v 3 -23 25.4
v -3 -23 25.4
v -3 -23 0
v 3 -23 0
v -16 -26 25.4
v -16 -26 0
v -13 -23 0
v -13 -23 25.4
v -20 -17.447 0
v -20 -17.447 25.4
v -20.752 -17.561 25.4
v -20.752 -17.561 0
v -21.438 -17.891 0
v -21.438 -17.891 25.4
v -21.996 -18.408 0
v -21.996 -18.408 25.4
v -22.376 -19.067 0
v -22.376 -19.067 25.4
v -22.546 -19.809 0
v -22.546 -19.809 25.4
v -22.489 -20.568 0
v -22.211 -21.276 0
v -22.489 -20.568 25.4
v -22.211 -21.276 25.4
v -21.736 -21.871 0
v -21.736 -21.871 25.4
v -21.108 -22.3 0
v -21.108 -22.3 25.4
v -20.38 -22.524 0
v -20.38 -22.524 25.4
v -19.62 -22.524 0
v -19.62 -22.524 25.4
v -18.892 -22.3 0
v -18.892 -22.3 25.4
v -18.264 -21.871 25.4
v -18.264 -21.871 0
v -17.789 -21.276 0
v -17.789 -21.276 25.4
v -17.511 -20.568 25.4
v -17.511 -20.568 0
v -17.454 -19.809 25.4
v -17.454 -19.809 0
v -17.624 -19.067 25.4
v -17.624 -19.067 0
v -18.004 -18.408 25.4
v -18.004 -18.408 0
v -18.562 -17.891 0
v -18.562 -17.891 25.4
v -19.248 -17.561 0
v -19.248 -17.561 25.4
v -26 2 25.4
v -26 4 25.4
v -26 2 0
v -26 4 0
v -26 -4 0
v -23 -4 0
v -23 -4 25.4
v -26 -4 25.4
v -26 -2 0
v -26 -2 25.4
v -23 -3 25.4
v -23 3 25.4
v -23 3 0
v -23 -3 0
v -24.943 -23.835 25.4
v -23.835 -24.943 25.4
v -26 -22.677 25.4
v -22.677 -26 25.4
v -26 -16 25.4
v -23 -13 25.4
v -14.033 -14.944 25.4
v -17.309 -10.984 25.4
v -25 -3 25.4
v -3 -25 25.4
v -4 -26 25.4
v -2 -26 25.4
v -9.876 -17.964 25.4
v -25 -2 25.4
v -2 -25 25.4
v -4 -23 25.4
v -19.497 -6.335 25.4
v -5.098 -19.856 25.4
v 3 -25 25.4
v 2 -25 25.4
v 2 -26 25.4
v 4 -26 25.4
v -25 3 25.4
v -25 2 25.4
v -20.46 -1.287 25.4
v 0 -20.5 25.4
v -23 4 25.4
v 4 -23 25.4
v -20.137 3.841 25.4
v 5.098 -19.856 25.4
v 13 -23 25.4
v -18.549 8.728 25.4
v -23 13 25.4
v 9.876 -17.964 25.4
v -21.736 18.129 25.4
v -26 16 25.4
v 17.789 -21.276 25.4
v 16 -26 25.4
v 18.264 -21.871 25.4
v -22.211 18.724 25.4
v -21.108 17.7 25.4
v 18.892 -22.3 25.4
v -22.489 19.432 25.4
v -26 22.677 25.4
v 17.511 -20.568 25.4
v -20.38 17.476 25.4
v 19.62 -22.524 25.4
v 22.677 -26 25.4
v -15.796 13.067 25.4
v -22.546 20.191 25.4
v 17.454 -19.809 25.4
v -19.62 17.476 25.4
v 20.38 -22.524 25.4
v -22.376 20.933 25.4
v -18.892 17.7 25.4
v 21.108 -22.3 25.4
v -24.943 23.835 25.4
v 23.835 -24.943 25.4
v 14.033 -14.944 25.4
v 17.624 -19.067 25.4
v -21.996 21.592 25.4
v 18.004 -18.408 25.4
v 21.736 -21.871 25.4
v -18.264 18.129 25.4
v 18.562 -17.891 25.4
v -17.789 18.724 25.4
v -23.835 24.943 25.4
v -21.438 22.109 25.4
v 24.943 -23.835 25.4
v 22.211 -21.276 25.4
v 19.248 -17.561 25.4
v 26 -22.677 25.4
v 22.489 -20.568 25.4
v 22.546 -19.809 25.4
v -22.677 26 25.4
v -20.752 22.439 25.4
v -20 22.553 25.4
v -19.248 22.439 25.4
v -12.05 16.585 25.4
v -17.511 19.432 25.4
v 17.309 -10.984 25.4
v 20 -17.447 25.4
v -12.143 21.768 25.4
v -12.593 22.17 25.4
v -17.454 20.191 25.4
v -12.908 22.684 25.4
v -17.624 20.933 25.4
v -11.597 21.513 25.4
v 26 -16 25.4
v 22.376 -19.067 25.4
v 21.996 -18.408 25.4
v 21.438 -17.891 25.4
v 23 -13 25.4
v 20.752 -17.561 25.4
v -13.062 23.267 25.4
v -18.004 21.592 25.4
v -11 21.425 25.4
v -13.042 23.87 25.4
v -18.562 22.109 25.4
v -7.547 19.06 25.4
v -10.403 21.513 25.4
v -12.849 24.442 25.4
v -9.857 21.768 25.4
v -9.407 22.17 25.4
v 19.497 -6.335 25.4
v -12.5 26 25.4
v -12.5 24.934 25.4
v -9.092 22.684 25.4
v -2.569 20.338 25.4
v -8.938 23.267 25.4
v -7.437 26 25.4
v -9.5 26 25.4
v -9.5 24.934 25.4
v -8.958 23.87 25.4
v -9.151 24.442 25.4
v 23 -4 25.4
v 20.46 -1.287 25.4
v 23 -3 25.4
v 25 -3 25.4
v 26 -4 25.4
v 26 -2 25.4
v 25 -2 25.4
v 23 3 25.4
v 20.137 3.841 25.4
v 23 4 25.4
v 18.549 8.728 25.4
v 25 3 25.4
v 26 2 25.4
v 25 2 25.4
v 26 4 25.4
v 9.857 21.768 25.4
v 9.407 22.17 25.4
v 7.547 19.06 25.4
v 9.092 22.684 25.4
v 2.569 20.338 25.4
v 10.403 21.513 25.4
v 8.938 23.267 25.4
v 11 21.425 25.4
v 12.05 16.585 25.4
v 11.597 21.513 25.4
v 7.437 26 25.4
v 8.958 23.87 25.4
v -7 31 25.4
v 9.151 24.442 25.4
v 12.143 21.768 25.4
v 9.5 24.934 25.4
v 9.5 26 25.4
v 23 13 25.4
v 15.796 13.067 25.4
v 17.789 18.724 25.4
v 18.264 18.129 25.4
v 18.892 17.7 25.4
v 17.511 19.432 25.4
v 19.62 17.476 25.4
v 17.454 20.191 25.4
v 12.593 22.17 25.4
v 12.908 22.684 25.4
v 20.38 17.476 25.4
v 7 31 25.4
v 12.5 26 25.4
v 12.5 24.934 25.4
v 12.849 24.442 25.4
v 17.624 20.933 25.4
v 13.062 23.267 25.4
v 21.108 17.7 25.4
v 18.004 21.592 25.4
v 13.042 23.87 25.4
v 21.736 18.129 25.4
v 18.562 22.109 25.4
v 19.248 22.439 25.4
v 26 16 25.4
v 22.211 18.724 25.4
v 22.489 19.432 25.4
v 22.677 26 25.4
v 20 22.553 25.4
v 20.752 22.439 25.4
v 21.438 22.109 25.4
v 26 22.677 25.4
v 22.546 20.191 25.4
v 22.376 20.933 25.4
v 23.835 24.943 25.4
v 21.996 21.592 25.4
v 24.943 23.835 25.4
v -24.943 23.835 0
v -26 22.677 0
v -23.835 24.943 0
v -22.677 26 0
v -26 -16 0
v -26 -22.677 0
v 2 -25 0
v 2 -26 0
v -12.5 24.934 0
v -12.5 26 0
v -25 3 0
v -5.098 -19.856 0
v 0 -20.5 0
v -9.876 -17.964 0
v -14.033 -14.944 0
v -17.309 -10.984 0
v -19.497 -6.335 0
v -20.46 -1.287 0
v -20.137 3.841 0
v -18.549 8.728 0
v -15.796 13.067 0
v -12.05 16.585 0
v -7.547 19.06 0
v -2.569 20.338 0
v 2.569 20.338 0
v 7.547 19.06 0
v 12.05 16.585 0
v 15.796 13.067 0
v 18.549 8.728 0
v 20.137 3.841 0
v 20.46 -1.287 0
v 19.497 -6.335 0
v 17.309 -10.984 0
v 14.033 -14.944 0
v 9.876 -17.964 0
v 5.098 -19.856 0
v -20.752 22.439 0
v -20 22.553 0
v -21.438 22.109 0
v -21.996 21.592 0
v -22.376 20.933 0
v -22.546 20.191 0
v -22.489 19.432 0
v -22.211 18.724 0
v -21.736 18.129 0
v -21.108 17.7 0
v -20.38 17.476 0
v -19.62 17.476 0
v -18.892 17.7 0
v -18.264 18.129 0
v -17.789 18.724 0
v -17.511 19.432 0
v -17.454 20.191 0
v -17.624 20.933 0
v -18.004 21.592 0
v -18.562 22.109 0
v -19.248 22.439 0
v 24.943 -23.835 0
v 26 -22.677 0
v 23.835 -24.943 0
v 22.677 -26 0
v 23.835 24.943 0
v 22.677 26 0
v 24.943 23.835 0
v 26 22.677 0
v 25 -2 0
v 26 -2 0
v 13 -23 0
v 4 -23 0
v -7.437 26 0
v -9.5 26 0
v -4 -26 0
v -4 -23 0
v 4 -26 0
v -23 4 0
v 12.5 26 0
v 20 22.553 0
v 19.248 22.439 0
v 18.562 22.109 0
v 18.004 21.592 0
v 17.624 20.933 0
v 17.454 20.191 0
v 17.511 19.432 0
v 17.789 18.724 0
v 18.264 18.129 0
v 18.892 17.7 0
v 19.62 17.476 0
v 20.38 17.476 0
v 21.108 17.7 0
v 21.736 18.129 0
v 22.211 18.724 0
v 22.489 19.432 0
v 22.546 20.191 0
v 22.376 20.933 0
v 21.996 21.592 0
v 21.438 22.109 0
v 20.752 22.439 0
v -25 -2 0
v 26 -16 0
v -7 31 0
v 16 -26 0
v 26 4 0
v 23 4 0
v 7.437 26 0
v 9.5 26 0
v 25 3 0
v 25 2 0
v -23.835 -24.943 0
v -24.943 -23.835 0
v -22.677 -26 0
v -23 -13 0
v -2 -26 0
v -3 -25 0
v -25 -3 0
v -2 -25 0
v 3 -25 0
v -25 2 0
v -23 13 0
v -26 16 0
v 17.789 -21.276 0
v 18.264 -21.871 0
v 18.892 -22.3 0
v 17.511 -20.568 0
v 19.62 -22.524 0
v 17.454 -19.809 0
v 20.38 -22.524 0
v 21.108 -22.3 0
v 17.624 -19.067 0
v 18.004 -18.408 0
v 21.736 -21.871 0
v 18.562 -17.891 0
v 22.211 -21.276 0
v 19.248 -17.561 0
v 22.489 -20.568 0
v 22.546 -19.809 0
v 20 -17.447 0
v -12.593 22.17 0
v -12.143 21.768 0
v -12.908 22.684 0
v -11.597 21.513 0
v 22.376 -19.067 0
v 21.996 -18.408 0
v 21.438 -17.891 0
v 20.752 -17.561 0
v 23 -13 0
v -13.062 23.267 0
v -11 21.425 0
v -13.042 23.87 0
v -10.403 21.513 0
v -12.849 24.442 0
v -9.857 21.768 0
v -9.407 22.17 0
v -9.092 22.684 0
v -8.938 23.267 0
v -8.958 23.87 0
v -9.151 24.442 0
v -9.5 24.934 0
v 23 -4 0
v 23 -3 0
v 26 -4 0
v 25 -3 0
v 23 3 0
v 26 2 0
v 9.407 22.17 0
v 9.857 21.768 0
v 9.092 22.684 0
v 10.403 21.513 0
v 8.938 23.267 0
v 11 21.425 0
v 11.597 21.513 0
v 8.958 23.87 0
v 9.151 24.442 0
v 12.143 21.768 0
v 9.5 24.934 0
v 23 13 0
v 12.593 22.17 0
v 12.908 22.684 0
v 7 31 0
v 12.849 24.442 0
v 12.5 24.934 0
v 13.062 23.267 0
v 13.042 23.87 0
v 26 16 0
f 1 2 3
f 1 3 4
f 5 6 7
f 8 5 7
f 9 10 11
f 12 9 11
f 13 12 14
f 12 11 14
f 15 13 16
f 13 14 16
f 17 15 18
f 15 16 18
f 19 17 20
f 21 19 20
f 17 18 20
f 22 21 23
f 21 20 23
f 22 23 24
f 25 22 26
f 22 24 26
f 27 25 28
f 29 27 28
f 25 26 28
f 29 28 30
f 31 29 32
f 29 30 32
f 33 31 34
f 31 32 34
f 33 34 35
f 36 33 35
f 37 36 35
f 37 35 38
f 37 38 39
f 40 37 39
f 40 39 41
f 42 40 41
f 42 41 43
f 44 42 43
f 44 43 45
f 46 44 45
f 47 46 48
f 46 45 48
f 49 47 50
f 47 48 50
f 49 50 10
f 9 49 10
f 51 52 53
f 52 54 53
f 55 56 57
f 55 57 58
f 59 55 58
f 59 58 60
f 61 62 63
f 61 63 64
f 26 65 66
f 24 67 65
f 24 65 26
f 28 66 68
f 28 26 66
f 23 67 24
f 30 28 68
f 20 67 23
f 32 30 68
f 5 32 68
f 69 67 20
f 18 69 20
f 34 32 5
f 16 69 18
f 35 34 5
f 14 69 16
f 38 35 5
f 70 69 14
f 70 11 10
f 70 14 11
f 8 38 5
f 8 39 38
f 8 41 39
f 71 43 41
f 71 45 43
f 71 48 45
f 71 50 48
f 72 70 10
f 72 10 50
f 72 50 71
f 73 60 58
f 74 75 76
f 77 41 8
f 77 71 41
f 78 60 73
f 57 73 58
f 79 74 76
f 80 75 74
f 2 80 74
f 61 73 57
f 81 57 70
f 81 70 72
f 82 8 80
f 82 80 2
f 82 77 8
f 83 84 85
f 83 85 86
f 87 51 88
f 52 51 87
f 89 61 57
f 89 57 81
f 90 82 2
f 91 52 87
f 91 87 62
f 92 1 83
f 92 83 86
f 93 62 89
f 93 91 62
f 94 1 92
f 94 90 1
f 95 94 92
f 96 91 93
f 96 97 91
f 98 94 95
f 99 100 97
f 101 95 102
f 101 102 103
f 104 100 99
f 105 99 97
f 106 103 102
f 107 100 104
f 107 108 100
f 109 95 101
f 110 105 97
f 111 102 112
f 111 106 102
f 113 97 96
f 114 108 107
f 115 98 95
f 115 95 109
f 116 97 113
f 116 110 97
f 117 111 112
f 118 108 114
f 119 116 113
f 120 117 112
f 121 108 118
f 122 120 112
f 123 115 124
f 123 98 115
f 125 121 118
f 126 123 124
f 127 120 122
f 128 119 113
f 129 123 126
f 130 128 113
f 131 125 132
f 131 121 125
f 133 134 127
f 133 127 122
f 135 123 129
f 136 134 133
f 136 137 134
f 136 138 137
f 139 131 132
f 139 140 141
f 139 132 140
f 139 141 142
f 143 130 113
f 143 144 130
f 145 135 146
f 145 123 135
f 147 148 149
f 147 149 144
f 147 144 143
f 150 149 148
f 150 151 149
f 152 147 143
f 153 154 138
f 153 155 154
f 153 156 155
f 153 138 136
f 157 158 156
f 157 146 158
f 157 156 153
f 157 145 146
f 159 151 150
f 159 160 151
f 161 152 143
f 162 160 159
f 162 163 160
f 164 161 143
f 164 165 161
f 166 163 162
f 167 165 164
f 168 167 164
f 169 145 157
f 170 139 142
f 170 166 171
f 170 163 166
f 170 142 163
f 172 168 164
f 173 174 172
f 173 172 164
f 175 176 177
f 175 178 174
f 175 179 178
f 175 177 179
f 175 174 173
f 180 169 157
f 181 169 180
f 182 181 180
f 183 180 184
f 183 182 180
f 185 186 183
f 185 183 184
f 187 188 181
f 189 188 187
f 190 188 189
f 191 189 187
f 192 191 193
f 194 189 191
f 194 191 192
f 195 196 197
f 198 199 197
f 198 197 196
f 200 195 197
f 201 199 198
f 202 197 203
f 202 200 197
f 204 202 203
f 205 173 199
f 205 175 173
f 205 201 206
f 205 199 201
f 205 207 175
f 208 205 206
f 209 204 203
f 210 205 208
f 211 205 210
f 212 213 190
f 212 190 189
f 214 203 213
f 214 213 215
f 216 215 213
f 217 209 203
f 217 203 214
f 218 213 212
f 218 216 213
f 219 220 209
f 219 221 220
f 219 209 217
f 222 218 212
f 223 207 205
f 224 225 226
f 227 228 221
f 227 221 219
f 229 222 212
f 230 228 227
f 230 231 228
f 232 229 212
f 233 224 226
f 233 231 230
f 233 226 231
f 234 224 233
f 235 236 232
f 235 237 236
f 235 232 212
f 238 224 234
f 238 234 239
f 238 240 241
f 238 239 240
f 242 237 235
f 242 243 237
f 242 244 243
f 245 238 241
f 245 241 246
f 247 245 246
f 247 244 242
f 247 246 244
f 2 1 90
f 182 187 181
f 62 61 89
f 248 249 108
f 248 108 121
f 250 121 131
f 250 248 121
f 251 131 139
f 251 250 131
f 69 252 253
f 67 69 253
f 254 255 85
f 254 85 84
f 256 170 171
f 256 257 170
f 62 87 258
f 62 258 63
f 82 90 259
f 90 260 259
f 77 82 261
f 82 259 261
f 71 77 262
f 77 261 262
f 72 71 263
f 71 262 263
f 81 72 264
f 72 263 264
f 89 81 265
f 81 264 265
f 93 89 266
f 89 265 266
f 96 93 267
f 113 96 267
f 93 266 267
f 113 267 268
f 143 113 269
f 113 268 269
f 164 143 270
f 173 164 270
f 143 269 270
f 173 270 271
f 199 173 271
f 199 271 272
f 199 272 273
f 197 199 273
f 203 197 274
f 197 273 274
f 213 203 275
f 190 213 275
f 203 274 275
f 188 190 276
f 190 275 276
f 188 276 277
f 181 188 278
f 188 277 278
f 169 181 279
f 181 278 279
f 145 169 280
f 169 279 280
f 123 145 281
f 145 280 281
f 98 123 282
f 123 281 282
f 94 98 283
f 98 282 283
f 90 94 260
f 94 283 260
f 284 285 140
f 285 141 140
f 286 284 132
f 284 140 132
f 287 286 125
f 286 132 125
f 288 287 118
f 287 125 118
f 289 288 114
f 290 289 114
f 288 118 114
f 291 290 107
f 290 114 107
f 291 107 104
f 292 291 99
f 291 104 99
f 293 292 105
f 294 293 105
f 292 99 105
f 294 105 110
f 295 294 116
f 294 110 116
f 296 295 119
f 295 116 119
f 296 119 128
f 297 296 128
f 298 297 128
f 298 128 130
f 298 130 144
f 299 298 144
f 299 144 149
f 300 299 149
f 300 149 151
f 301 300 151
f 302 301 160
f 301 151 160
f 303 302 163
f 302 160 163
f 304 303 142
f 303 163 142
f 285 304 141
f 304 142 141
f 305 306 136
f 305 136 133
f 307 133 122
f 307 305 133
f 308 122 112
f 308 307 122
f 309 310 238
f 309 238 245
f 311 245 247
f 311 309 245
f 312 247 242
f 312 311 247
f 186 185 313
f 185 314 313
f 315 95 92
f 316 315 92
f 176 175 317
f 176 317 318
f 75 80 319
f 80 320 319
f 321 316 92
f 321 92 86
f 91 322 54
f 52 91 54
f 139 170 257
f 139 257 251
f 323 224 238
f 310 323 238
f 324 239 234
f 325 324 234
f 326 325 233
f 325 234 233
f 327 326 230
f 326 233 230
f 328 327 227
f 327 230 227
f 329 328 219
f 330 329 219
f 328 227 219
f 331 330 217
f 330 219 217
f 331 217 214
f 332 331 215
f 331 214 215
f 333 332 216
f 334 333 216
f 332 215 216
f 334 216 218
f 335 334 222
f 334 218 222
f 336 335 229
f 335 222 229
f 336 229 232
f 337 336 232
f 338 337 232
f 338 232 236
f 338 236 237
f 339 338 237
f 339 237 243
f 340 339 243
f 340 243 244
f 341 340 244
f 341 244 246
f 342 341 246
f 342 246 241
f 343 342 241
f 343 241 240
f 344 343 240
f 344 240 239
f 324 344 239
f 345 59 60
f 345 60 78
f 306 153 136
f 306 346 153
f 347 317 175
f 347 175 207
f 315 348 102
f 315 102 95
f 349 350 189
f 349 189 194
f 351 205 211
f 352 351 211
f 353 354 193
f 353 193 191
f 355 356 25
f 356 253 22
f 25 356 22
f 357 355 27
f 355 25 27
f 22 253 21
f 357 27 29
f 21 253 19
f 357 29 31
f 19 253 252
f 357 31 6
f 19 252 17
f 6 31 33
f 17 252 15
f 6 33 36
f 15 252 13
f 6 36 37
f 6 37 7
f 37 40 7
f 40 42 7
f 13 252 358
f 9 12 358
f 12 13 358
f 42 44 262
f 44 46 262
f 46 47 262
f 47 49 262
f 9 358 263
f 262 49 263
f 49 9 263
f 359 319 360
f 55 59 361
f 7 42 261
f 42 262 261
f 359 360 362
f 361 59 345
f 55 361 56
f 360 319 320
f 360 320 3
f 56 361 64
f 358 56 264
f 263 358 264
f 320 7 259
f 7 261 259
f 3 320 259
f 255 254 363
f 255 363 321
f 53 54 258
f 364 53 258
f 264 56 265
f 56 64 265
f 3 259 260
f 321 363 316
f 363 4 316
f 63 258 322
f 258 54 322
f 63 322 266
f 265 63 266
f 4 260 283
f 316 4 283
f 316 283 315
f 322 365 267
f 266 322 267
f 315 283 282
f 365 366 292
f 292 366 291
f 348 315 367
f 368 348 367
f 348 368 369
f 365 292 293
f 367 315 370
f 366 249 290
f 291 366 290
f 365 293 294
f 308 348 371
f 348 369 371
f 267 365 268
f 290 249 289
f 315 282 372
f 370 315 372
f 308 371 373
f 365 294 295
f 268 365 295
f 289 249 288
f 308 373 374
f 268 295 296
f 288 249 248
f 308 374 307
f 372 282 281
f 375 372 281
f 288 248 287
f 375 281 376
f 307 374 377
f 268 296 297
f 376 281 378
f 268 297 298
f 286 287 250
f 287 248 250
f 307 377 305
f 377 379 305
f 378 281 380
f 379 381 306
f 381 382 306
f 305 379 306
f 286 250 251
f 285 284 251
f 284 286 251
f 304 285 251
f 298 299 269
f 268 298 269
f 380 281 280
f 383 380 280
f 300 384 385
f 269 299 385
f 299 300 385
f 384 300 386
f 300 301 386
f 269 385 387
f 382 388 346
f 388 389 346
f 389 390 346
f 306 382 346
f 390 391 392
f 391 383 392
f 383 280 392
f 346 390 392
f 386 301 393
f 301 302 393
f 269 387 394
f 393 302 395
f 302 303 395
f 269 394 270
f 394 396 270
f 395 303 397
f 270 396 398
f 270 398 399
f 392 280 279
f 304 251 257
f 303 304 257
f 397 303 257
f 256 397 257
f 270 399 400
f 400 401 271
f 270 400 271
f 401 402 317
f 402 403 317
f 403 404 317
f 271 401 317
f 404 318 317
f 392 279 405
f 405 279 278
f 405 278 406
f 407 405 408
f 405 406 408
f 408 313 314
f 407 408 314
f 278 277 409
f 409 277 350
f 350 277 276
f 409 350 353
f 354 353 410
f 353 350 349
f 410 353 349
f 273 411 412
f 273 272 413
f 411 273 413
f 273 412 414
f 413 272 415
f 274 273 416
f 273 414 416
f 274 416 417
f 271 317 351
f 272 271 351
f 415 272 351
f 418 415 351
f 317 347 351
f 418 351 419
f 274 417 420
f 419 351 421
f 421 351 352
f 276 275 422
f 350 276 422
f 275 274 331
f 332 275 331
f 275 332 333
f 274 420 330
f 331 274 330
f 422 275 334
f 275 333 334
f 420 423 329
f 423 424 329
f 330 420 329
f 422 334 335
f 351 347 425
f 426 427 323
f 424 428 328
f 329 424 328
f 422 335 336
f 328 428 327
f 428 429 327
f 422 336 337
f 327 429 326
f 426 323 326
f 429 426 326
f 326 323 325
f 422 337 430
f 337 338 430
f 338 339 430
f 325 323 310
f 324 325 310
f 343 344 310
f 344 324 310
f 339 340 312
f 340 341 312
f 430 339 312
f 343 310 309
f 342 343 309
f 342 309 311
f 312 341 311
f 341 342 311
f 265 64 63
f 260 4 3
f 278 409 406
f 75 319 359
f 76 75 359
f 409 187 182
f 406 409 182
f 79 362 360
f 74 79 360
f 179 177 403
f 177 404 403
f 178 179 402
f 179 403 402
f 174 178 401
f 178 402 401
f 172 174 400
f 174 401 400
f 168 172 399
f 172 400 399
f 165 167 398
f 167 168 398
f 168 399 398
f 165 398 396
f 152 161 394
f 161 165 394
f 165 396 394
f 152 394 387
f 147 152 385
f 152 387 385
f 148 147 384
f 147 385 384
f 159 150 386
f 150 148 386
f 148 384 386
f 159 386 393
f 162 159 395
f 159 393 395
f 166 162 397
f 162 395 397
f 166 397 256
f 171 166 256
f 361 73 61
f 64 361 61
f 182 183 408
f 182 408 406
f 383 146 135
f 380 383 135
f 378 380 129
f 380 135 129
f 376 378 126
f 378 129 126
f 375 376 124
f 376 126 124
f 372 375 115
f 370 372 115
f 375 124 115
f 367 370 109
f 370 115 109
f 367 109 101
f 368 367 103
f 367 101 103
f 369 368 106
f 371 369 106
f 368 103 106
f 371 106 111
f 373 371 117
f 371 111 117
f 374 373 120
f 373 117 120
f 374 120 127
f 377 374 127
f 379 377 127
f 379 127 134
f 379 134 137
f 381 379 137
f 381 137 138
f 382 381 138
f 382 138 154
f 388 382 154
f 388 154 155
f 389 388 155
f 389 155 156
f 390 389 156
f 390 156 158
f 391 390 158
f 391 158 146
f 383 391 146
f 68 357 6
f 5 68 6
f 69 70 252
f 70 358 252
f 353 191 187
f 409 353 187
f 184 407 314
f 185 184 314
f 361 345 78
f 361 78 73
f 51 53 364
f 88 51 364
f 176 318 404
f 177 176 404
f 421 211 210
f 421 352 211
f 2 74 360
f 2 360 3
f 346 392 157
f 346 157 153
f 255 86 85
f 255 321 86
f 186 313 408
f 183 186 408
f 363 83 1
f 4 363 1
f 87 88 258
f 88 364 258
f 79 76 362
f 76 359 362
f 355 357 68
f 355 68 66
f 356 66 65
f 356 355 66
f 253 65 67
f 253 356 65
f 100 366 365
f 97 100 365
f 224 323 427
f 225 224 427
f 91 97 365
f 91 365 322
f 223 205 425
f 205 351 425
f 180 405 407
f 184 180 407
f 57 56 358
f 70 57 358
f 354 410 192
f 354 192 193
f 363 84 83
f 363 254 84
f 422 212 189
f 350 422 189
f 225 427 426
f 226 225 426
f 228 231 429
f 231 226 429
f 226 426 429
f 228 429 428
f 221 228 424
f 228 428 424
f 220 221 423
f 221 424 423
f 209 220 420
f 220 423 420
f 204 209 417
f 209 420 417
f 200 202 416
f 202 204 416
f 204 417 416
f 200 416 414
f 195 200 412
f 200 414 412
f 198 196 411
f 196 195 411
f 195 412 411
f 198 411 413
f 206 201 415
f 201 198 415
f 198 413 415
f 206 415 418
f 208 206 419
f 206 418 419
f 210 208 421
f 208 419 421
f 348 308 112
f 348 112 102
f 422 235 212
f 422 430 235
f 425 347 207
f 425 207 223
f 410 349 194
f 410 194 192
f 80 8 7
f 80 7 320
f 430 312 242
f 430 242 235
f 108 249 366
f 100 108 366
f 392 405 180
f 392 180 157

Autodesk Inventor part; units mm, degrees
ref_plane "YZ Plane" through (0, 0, 0) normal (1, 0, 0) x (0, 1, 0)
ref_plane "XZ Plane" through (0, 0, 0) normal (0, 1, 0) x (-1, 0, 0)
ref_plane "XY Plane" through (0, 0, 0) normal (0, 0, 1) x (1, 0, 0)
sketch "Sketch1" plane through (0, 0, 0) normal (0, 0, 1) x (1, 0, 0)
  line L0 (-7.4374, 26) -> (-7, 31)
  line L1 (0, 31) -> (0, 0) construction
  line L2 (-7, 31) -> (0, 31)
  line L3 (-9.5, 26) -> (-9.5, 24.9337)
  line L4 (-12.5, 26) -> (-12.5, 24.9337)
  line L5 (-7.4374, 26) -> (-9.5, 26)
  line L6 (-12.5, 26) -> (-22.6771, 26)
  arc A0 (-12.5, 24.9337) -> (-9.5, 24.9337) centre (-11, 23.5) ccw
  line L7 (-22.6771, -26) -> (-16, -26)
  line L8 (0, -23) -> (0, 0) construction
  arc A1 (-26, -22.6771) -> (-22.6771, -26) centre (0, 0) ccw
  arc A2 (-22.6771, 26) -> (-26, 22.6771) centre (0, 0) ccw
  line L9 (-26, 16) -> (-23, 13)
  line L10 (-23, -13) -> (-26, -16)
  line L11 (-26, 22.6771) -> (-26, 16)
  line L12 (-26, -16) -> (-26, -22.6771)
  line L13 (-16, -26) -> (-13, -23)
  line L14 (-23, 4) -> (-26, 4)
  line L15 (-26, 4) -> (-26, 2)
  line L16 (-26, 2) -> (-25, 2)
  line L17 (-25, 2) -> (-25, 3)
  line L18 (-25, 3) -> (-23, 3)
  line L19 (-23, -4) -> (-26, -4)
  line L20 (-26, -4) -> (-26, -2)
  line L21 (-26, -2) -> (-25, -2)
  line L22 (-25, -2) -> (-25, -3)
  line L23 (-25, -3) -> (-23, -3)
  line L24 (-4, -23) -> (-4, -26)
  line L25 (-4, -26) -> (-2, -26)
  line L26 (-2, -26) -> (-2, -25)
  line L27 (-2, -25) -> (-3, -25)
  line L28 (-3, -25) -> (-3, -23)
  line L29 (-23, 13) -> (-23, 4)
  line L30 (-23, 3) -> (-23, -3)
  line L31 (-23, -4) -> (-23, -13)
  line L32 (-13, -23) -> (-4, -23)
  line L33 (-3, -23) -> (0, -23)
  arc A3 (0, 20.5) -> (0, -20.5) centre (0, 0) ccw
  line L34 (0, 36.125) -> (0, -43.6282) construction
  line L35 (7.4374, 26) -> (7, 31)
  line L36 (7, 31) -> (0, 31)
  line L37 (9.5, 26) -> (9.5, 24.9337)
  line L38 (12.5, 26) -> (12.5, 24.9337)
  line L39 (7.4374, 26) -> (9.5, 26)
  line L40 (12.5, 26) -> (22.6771, 26)
  arc A4 (9.5, 24.9337) -> (12.5, 24.9337) centre (11, 23.5) ccw
  line L41 (22.6771, -26) -> (16, -26)
  arc A5 (22.6771, -26) -> (26, -22.6771) centre (0, 0) ccw
  arc A6 (26, 22.6771) -> (22.6771, 26) centre (0, 0) ccw
  line L42 (26, 16) -> (23, 13)
  line L43 (23, -13) -> (26, -16)
  line L44 (26, 22.6771) -> (26, 16)
  line L45 (26, -16) -> (26, -22.6771)
  line L46 (16, -26) -> (13, -23)
  line L47 (23, 4) -> (26, 4)
  line L48 (26, 4) -> (26, 2)
  line L49 (26, 2) -> (25, 2)
  line L50 (25, 2) -> (25, 3)
  line L51 (25, 3) -> (23, 3)
  line L52 (23, -4) -> (26, -4)
  line L53 (26, -4) -> (26, -2)
  line L54 (26, -2) -> (25, -2)
  line L55 (25, -2) -> (25, -3)
  line L56 (25, -3) -> (23, -3)
  line L57 (4, -23) -> (4, -26)
  line L58 (4, -26) -> (2, -26)
  line L59 (2, -26) -> (2, -25)
  line L60 (2, -25) -> (3, -25)
  line L61 (3, -25) -> (3, -23)
  line L62 (23, 13) -> (23, 4)
  line L63 (23, 3) -> (23, -3)
  line L64 (23, -4) -> (23, -13)
  line L65 (13, -23) -> (4, -23)
  line L66 (3, -23) -> (0, -23)
  arc A7 (0, -20.5) -> (0, 20.5) centre (0, 0) ccw
  point P0 (-20, 20)
  point P1 (-20, -20)
  point P2 (20, 20)
  point P3 (20, -20)
  dimension "d3" = 7.4374
  dimension "d4" = 7
  dimension "d6" = 31
  dimension "d7" = 5
  dimension "d8" = 3
  dimension "d9" = 2.075
  dimension "d10" = 2.5
  dimension "d11" = 11
  dimension "d15" = 34.5
  dimension "d16" = 34.5
  dimension "d19" = 26
  dimension "d20" = 13
  dimension "d21" = 26
  dimension "d22" = 26
  dimension "d23" = 6.6771
  dimension "d24" = 23
  dimension "d25" = 1
  dimension "d26" = 1
  dimension "d27" = 26
  dimension "d28" = 8
  dimension "d29" = 4
  dimension "d30" = 4
  dimension "d31" = 2
  dimension "d32" = 20.5
  dimension "d33" = 40
  dimension "d34" = 20
  dimension "d35" = 20
extrude "SMC, 40MM" add sketch "Sketch1" along normal blind 25.4
hole "Hole1" at (-20, 20, 0) at (-20, -20, 0) at (20, 20, 0) at (20, -20, 0) direction (0, 0, 1) diameter 5.1054 end through all
equation "\"d20\" = 0.5 * d19"
equation "\"d26\" = d25"
equation "\"d30\" = 0.5 * d28"
equation "\"d34\" = 0.5 * d33"
equation "\"d35\" = d34"
properties part number "EXTRUSION, CYLINDER, ALUMINIUM, SMC, 40MM" material "Extrusion, Aluminum, SMC, 40 MM"
